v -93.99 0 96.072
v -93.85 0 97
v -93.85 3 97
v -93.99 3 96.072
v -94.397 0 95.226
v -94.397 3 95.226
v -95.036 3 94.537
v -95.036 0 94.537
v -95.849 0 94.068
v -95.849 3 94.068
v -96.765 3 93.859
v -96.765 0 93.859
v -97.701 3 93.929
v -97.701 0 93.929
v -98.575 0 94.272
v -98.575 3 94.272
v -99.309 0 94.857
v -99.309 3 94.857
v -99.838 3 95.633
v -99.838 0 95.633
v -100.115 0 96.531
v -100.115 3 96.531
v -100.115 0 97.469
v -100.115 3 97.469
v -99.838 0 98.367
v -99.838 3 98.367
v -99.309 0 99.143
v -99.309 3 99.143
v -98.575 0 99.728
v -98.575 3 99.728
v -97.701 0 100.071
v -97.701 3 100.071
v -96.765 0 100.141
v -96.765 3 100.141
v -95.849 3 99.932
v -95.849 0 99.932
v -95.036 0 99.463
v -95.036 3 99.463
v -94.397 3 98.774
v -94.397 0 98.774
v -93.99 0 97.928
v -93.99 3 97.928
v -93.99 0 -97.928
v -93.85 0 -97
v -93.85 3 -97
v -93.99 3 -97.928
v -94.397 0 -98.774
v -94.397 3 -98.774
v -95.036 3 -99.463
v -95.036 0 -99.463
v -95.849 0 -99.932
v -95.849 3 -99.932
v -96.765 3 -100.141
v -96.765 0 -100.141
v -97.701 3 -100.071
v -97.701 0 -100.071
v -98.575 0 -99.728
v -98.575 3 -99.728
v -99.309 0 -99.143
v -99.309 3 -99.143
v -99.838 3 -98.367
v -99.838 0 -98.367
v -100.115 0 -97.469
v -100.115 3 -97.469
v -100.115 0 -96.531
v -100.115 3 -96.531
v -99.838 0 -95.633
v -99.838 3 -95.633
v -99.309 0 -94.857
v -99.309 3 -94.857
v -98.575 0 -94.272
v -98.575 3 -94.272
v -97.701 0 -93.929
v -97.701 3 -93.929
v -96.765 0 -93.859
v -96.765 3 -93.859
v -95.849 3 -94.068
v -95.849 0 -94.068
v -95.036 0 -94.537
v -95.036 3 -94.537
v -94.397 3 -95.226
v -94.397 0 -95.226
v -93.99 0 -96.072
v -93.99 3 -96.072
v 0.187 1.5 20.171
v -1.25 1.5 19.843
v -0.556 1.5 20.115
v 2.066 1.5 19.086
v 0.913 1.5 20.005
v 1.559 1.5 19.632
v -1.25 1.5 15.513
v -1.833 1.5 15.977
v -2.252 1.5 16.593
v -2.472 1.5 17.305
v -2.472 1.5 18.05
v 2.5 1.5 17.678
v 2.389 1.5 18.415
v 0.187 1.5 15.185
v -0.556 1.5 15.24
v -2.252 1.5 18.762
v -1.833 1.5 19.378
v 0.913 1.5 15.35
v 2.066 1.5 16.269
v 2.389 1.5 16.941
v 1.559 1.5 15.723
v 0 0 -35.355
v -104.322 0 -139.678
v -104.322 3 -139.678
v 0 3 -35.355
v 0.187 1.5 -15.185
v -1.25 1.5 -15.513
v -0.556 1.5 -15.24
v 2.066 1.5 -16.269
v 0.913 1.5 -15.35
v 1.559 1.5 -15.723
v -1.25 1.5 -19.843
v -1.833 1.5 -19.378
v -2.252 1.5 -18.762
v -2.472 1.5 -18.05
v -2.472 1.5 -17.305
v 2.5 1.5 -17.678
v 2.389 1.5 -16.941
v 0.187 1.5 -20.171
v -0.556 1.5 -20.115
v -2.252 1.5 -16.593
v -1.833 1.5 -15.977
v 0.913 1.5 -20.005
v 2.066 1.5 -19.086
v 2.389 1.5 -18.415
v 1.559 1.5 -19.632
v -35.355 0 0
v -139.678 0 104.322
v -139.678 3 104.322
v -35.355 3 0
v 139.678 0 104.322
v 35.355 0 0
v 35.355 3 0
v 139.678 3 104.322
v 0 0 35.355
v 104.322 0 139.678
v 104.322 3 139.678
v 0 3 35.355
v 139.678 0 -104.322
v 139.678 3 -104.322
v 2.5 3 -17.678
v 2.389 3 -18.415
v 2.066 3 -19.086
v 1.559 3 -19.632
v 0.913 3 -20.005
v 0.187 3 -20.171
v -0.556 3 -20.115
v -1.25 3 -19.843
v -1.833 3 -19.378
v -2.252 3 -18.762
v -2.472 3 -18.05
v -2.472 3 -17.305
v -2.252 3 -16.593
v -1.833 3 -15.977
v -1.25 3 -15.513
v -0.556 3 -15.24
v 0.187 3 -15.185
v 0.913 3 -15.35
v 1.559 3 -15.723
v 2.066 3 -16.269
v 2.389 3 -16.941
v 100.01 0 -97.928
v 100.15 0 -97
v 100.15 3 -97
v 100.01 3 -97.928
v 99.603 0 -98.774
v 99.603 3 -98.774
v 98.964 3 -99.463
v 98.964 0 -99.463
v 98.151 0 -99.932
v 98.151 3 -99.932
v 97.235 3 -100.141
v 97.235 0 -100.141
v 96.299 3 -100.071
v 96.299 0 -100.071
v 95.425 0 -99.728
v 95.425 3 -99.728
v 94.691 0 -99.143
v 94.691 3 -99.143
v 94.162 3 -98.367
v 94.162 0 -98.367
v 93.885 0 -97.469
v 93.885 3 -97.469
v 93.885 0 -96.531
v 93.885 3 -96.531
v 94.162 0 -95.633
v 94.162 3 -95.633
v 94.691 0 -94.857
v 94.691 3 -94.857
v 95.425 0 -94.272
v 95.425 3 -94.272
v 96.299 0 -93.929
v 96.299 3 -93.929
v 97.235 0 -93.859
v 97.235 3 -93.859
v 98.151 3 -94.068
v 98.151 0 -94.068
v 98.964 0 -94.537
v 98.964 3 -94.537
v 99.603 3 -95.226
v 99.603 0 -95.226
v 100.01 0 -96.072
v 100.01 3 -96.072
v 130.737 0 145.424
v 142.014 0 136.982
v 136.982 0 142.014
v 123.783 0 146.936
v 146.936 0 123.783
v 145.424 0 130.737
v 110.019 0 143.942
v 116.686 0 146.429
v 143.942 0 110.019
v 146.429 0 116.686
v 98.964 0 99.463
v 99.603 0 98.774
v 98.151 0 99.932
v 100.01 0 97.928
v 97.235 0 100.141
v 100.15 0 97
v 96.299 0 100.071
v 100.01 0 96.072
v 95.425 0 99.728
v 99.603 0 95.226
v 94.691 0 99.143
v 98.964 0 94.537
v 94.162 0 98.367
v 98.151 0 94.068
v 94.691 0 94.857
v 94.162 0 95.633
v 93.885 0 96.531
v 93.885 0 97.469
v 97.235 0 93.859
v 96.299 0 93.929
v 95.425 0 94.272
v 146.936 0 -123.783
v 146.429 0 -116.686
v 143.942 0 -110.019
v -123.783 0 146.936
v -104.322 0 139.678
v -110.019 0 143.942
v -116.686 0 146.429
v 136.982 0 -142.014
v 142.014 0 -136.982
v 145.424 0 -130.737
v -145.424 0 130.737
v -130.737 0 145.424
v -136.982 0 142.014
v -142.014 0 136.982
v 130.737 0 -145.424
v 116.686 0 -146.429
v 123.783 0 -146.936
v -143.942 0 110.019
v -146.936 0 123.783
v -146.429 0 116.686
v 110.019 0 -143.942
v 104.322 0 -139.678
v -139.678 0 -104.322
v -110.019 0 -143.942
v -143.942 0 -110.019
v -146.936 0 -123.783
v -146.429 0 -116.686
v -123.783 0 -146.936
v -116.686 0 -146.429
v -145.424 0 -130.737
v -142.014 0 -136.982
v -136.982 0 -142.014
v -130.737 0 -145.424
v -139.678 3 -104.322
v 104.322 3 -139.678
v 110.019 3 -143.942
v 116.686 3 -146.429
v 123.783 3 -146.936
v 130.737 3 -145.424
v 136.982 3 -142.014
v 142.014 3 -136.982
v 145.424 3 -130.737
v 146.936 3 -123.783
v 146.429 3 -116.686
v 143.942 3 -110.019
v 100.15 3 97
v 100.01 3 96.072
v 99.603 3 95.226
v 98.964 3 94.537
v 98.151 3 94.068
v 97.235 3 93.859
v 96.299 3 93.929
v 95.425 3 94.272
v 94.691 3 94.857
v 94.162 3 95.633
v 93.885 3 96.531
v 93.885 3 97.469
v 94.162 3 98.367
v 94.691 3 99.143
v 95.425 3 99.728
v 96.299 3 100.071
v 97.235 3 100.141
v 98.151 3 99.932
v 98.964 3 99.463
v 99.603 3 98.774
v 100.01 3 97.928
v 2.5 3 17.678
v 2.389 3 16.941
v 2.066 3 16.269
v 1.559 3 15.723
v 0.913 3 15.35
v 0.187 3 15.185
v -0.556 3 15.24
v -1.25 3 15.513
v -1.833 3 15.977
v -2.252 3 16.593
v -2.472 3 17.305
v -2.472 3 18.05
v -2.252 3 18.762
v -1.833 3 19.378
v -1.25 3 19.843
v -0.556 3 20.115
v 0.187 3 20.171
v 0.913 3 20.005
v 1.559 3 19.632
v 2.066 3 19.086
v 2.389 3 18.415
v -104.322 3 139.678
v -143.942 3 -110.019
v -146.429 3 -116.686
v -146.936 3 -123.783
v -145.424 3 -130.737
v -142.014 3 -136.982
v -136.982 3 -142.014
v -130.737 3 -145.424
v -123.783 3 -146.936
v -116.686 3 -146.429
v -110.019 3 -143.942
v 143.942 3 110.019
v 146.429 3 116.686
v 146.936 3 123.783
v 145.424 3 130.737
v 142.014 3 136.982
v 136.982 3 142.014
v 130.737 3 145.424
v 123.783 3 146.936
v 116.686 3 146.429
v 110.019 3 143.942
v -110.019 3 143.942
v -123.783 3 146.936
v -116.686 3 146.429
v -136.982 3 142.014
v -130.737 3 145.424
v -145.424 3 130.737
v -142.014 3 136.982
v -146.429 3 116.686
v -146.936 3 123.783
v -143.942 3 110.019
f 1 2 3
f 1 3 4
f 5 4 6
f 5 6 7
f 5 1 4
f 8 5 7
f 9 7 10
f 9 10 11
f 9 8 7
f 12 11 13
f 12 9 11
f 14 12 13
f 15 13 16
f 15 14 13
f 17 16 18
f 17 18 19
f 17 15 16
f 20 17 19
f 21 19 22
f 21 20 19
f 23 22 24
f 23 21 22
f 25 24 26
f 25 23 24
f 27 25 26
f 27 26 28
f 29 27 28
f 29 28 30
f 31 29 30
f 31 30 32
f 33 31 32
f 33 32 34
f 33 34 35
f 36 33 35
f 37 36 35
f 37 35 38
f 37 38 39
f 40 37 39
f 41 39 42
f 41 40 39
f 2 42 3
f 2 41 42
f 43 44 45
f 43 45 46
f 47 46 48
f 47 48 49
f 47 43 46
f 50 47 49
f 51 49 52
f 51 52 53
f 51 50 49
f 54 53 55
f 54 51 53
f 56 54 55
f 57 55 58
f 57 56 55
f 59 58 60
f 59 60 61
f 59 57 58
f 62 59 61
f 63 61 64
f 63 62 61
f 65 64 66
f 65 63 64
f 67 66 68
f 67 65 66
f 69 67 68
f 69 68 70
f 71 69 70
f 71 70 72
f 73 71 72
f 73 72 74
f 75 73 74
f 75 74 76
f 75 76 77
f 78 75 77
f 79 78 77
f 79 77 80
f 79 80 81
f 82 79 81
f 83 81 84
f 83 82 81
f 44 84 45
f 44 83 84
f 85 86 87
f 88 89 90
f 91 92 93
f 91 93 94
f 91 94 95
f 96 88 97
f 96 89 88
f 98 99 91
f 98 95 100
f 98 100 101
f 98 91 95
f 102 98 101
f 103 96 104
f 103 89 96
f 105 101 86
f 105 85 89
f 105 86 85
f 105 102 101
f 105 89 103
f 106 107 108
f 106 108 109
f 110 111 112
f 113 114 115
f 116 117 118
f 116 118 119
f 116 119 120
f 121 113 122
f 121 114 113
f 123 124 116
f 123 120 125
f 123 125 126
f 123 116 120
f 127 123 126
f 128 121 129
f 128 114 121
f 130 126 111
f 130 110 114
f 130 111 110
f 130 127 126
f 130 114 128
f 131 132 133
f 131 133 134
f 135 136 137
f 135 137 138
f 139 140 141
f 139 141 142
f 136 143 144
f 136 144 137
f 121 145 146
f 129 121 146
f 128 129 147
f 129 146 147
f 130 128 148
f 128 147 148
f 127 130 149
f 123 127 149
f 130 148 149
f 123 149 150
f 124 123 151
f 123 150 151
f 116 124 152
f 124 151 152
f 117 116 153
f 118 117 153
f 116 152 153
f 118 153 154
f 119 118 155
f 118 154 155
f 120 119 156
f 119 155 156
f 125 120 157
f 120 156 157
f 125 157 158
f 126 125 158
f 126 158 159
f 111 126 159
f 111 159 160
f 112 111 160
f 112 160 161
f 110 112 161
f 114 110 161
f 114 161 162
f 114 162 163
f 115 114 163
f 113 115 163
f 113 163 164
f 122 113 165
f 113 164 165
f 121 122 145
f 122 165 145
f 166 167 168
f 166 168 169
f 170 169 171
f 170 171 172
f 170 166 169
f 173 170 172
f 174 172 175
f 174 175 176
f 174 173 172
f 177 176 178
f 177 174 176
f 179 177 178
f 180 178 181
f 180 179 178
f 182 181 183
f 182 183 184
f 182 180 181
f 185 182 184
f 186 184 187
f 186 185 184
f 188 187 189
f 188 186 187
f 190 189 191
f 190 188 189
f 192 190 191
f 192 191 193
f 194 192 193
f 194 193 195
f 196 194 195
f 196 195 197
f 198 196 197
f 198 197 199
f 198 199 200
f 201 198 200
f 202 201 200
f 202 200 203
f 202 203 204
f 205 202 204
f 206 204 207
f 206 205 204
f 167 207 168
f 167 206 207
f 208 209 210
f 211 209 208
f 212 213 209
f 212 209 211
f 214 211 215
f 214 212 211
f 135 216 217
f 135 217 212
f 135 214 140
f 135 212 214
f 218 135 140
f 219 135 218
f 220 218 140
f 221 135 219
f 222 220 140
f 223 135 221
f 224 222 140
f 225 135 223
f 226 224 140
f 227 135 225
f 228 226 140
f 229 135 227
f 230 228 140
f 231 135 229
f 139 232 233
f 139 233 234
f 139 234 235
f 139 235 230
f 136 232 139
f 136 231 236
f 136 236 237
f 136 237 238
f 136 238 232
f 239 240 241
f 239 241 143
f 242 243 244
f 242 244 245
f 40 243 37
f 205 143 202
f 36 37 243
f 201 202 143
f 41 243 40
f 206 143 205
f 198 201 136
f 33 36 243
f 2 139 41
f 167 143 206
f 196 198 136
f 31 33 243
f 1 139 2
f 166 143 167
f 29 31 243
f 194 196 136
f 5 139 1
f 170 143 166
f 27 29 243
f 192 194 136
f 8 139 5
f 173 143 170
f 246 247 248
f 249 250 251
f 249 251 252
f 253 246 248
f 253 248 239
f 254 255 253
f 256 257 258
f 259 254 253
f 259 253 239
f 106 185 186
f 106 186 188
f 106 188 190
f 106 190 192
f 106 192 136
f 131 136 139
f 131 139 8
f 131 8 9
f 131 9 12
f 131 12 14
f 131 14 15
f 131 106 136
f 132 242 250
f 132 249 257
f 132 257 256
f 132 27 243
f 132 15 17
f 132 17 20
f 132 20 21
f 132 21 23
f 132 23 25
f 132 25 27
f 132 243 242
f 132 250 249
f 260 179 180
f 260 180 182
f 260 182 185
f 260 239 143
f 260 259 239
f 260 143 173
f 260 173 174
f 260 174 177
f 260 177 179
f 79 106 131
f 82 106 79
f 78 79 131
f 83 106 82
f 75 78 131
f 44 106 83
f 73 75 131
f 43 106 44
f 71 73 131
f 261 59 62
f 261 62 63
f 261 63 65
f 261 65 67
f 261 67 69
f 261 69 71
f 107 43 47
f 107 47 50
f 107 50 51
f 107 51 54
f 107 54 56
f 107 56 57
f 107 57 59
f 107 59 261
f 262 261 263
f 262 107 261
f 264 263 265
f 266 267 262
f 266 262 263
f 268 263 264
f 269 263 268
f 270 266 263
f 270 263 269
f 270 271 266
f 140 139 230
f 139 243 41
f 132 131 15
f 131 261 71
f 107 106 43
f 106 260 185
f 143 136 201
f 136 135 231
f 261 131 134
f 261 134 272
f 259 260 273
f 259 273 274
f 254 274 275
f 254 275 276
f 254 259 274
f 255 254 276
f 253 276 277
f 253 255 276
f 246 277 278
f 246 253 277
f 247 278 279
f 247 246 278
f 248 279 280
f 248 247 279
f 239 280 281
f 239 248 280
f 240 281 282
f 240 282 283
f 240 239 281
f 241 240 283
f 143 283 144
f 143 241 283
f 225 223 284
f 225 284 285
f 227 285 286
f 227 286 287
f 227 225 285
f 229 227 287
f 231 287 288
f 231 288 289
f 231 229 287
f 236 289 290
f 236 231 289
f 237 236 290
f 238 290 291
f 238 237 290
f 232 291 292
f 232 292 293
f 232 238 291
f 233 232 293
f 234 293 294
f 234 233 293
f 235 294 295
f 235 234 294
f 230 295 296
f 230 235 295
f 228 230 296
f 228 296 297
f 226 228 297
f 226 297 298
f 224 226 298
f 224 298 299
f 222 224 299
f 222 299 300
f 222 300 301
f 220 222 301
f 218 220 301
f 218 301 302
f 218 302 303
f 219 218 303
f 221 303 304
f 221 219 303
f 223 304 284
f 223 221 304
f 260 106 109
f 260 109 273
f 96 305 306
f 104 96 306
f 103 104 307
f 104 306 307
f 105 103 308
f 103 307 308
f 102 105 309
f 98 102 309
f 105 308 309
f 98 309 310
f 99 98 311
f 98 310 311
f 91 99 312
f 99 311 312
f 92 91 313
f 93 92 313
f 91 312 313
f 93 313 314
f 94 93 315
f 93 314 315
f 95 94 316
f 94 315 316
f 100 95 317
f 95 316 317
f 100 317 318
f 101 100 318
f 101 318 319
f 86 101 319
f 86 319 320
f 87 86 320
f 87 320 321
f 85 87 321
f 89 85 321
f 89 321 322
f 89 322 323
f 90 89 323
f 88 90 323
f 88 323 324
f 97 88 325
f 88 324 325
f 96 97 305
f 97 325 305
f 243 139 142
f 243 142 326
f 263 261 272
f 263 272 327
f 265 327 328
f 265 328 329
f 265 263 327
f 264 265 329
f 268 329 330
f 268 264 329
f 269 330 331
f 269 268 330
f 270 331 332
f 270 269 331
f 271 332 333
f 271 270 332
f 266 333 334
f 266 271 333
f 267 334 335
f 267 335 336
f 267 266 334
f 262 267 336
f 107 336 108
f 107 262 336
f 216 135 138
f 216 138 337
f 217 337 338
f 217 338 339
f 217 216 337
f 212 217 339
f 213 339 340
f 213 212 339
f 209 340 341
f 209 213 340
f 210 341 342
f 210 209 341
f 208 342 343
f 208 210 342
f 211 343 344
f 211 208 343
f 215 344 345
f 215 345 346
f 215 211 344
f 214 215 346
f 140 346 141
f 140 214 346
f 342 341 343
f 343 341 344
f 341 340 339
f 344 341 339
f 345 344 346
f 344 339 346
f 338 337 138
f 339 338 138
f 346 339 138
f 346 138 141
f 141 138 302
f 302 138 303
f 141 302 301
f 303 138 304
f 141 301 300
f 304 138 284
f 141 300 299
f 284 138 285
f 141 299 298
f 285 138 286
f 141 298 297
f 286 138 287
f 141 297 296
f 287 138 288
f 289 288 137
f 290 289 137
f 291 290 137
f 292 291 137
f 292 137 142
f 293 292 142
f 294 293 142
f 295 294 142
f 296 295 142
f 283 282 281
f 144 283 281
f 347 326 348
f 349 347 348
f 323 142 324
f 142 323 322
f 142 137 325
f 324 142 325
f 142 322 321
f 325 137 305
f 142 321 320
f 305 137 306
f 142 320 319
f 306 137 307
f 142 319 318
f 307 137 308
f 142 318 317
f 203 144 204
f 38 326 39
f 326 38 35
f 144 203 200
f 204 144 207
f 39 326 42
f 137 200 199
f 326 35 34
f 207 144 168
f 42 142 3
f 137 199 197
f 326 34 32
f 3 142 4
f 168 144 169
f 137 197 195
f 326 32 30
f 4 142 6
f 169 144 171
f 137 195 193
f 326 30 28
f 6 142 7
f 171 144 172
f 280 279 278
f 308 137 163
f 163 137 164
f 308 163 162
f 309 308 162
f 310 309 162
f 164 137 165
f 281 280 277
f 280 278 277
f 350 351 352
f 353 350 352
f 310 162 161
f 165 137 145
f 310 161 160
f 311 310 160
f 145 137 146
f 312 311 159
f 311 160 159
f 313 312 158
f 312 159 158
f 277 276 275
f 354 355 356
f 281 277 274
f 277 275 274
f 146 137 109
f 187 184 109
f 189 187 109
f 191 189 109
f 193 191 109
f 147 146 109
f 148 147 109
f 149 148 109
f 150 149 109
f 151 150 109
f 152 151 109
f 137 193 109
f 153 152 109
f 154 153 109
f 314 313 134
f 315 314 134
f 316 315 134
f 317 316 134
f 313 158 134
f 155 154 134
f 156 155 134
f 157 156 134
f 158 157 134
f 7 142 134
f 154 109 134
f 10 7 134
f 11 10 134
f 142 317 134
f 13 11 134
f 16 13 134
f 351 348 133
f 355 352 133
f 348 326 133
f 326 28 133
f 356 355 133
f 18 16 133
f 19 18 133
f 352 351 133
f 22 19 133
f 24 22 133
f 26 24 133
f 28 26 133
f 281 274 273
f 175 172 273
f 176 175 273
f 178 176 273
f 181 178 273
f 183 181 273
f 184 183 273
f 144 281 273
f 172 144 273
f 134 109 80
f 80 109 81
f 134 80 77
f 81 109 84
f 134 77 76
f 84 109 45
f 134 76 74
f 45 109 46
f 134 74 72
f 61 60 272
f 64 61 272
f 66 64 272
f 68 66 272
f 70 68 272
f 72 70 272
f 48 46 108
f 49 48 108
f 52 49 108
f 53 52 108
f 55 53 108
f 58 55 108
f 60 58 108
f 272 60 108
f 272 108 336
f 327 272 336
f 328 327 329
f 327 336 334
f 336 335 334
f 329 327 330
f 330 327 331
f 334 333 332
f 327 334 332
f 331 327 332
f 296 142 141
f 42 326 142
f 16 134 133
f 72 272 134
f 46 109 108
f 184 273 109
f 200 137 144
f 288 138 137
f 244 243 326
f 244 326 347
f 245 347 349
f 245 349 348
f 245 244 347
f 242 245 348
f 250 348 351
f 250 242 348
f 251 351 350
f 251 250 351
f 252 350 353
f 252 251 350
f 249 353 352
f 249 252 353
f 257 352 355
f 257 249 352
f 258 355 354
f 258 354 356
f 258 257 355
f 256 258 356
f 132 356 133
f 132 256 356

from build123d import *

# Parameters (mm, degrees)
SKETCH2_R           = 3.15
BOSS_EXTRUDE2_DEPTH = 3
SKETCH4_R           = 2.5
CUT_EXTRUDE1_DEPTH  = 1.5


with BuildPart() as part:
    # Sketch2 → Boss-Extrude2 (new body)
    with BuildSketch(Plane(origin=(0, 0, 0), x_dir=(1, 0, 0), z_dir=(0, 1, 0))):
        with BuildLine():
            Line((104.32233047, -139.67766953), (0, -35.355339059))
            Line((0, -35.355339059), (-104.32233047, -139.67766953))
            ThreePointArc((-104.32233047, -139.67766953), (-139.67766953, -139.67766953), (-139.67766953, -104.32233047))
            Line((-139.67766953, -104.32233047), (-35.355339059, 0))
            Line((-35.355339059, 0), (-139.67766953, 104.32233047))
            ThreePointArc((-139.67766953, 104.32233047), (-139.67766953, 139.67766953), (-104.32233047, 139.67766953))
            Line((-104.32233047, 139.67766953), (0, 35.355339059))
            Line((0, 35.355339059), (104.32233047, 139.67766953))
            ThreePointArc((104.32233047, 139.67766953), (139.67766953, 139.67766953), (139.67766953, 104.32233047))
            Line((139.67766953, 104.32233047), (35.355339059, 0))
            Line((35.355339059, 0), (139.67766953, -104.32233047))
            ThreePointArc((139.67766953, -104.32233047), (139.67766953, -139.67766953), (104.32233047, -139.67766953))
        make_face()
        with Locations((-97, 97)):
            Circle(SKETCH2_R, mode=Mode.SUBTRACT)
        with Locations((97, -97)):
            Circle(SKETCH2_R, mode=Mode.SUBTRACT)
        with Locations((97, 97)):
            Circle(SKETCH2_R, mode=Mode.SUBTRACT)
        with Locations((-97, -97)):
            Circle(SKETCH2_R, mode=Mode.SUBTRACT)
    extrude(amount=BOSS_EXTRUDE2_DEPTH)

    # Sketch4 → Cut-Extrude1 (cut)
    with BuildSketch(Plane(origin=(0, 3, 0), x_dir=(1, 0, 0), z_dir=(0, 1, 0))):
        with Locations((0, 17.67766953)):
            Circle(SKETCH4_R)
        with Locations((0, -17.67766953)):
            Circle(SKETCH4_R)
    extrude(amount=-CUT_EXTRUDE1_DEPTH, mode=Mode.SUBTRACT)


solid = part.part
